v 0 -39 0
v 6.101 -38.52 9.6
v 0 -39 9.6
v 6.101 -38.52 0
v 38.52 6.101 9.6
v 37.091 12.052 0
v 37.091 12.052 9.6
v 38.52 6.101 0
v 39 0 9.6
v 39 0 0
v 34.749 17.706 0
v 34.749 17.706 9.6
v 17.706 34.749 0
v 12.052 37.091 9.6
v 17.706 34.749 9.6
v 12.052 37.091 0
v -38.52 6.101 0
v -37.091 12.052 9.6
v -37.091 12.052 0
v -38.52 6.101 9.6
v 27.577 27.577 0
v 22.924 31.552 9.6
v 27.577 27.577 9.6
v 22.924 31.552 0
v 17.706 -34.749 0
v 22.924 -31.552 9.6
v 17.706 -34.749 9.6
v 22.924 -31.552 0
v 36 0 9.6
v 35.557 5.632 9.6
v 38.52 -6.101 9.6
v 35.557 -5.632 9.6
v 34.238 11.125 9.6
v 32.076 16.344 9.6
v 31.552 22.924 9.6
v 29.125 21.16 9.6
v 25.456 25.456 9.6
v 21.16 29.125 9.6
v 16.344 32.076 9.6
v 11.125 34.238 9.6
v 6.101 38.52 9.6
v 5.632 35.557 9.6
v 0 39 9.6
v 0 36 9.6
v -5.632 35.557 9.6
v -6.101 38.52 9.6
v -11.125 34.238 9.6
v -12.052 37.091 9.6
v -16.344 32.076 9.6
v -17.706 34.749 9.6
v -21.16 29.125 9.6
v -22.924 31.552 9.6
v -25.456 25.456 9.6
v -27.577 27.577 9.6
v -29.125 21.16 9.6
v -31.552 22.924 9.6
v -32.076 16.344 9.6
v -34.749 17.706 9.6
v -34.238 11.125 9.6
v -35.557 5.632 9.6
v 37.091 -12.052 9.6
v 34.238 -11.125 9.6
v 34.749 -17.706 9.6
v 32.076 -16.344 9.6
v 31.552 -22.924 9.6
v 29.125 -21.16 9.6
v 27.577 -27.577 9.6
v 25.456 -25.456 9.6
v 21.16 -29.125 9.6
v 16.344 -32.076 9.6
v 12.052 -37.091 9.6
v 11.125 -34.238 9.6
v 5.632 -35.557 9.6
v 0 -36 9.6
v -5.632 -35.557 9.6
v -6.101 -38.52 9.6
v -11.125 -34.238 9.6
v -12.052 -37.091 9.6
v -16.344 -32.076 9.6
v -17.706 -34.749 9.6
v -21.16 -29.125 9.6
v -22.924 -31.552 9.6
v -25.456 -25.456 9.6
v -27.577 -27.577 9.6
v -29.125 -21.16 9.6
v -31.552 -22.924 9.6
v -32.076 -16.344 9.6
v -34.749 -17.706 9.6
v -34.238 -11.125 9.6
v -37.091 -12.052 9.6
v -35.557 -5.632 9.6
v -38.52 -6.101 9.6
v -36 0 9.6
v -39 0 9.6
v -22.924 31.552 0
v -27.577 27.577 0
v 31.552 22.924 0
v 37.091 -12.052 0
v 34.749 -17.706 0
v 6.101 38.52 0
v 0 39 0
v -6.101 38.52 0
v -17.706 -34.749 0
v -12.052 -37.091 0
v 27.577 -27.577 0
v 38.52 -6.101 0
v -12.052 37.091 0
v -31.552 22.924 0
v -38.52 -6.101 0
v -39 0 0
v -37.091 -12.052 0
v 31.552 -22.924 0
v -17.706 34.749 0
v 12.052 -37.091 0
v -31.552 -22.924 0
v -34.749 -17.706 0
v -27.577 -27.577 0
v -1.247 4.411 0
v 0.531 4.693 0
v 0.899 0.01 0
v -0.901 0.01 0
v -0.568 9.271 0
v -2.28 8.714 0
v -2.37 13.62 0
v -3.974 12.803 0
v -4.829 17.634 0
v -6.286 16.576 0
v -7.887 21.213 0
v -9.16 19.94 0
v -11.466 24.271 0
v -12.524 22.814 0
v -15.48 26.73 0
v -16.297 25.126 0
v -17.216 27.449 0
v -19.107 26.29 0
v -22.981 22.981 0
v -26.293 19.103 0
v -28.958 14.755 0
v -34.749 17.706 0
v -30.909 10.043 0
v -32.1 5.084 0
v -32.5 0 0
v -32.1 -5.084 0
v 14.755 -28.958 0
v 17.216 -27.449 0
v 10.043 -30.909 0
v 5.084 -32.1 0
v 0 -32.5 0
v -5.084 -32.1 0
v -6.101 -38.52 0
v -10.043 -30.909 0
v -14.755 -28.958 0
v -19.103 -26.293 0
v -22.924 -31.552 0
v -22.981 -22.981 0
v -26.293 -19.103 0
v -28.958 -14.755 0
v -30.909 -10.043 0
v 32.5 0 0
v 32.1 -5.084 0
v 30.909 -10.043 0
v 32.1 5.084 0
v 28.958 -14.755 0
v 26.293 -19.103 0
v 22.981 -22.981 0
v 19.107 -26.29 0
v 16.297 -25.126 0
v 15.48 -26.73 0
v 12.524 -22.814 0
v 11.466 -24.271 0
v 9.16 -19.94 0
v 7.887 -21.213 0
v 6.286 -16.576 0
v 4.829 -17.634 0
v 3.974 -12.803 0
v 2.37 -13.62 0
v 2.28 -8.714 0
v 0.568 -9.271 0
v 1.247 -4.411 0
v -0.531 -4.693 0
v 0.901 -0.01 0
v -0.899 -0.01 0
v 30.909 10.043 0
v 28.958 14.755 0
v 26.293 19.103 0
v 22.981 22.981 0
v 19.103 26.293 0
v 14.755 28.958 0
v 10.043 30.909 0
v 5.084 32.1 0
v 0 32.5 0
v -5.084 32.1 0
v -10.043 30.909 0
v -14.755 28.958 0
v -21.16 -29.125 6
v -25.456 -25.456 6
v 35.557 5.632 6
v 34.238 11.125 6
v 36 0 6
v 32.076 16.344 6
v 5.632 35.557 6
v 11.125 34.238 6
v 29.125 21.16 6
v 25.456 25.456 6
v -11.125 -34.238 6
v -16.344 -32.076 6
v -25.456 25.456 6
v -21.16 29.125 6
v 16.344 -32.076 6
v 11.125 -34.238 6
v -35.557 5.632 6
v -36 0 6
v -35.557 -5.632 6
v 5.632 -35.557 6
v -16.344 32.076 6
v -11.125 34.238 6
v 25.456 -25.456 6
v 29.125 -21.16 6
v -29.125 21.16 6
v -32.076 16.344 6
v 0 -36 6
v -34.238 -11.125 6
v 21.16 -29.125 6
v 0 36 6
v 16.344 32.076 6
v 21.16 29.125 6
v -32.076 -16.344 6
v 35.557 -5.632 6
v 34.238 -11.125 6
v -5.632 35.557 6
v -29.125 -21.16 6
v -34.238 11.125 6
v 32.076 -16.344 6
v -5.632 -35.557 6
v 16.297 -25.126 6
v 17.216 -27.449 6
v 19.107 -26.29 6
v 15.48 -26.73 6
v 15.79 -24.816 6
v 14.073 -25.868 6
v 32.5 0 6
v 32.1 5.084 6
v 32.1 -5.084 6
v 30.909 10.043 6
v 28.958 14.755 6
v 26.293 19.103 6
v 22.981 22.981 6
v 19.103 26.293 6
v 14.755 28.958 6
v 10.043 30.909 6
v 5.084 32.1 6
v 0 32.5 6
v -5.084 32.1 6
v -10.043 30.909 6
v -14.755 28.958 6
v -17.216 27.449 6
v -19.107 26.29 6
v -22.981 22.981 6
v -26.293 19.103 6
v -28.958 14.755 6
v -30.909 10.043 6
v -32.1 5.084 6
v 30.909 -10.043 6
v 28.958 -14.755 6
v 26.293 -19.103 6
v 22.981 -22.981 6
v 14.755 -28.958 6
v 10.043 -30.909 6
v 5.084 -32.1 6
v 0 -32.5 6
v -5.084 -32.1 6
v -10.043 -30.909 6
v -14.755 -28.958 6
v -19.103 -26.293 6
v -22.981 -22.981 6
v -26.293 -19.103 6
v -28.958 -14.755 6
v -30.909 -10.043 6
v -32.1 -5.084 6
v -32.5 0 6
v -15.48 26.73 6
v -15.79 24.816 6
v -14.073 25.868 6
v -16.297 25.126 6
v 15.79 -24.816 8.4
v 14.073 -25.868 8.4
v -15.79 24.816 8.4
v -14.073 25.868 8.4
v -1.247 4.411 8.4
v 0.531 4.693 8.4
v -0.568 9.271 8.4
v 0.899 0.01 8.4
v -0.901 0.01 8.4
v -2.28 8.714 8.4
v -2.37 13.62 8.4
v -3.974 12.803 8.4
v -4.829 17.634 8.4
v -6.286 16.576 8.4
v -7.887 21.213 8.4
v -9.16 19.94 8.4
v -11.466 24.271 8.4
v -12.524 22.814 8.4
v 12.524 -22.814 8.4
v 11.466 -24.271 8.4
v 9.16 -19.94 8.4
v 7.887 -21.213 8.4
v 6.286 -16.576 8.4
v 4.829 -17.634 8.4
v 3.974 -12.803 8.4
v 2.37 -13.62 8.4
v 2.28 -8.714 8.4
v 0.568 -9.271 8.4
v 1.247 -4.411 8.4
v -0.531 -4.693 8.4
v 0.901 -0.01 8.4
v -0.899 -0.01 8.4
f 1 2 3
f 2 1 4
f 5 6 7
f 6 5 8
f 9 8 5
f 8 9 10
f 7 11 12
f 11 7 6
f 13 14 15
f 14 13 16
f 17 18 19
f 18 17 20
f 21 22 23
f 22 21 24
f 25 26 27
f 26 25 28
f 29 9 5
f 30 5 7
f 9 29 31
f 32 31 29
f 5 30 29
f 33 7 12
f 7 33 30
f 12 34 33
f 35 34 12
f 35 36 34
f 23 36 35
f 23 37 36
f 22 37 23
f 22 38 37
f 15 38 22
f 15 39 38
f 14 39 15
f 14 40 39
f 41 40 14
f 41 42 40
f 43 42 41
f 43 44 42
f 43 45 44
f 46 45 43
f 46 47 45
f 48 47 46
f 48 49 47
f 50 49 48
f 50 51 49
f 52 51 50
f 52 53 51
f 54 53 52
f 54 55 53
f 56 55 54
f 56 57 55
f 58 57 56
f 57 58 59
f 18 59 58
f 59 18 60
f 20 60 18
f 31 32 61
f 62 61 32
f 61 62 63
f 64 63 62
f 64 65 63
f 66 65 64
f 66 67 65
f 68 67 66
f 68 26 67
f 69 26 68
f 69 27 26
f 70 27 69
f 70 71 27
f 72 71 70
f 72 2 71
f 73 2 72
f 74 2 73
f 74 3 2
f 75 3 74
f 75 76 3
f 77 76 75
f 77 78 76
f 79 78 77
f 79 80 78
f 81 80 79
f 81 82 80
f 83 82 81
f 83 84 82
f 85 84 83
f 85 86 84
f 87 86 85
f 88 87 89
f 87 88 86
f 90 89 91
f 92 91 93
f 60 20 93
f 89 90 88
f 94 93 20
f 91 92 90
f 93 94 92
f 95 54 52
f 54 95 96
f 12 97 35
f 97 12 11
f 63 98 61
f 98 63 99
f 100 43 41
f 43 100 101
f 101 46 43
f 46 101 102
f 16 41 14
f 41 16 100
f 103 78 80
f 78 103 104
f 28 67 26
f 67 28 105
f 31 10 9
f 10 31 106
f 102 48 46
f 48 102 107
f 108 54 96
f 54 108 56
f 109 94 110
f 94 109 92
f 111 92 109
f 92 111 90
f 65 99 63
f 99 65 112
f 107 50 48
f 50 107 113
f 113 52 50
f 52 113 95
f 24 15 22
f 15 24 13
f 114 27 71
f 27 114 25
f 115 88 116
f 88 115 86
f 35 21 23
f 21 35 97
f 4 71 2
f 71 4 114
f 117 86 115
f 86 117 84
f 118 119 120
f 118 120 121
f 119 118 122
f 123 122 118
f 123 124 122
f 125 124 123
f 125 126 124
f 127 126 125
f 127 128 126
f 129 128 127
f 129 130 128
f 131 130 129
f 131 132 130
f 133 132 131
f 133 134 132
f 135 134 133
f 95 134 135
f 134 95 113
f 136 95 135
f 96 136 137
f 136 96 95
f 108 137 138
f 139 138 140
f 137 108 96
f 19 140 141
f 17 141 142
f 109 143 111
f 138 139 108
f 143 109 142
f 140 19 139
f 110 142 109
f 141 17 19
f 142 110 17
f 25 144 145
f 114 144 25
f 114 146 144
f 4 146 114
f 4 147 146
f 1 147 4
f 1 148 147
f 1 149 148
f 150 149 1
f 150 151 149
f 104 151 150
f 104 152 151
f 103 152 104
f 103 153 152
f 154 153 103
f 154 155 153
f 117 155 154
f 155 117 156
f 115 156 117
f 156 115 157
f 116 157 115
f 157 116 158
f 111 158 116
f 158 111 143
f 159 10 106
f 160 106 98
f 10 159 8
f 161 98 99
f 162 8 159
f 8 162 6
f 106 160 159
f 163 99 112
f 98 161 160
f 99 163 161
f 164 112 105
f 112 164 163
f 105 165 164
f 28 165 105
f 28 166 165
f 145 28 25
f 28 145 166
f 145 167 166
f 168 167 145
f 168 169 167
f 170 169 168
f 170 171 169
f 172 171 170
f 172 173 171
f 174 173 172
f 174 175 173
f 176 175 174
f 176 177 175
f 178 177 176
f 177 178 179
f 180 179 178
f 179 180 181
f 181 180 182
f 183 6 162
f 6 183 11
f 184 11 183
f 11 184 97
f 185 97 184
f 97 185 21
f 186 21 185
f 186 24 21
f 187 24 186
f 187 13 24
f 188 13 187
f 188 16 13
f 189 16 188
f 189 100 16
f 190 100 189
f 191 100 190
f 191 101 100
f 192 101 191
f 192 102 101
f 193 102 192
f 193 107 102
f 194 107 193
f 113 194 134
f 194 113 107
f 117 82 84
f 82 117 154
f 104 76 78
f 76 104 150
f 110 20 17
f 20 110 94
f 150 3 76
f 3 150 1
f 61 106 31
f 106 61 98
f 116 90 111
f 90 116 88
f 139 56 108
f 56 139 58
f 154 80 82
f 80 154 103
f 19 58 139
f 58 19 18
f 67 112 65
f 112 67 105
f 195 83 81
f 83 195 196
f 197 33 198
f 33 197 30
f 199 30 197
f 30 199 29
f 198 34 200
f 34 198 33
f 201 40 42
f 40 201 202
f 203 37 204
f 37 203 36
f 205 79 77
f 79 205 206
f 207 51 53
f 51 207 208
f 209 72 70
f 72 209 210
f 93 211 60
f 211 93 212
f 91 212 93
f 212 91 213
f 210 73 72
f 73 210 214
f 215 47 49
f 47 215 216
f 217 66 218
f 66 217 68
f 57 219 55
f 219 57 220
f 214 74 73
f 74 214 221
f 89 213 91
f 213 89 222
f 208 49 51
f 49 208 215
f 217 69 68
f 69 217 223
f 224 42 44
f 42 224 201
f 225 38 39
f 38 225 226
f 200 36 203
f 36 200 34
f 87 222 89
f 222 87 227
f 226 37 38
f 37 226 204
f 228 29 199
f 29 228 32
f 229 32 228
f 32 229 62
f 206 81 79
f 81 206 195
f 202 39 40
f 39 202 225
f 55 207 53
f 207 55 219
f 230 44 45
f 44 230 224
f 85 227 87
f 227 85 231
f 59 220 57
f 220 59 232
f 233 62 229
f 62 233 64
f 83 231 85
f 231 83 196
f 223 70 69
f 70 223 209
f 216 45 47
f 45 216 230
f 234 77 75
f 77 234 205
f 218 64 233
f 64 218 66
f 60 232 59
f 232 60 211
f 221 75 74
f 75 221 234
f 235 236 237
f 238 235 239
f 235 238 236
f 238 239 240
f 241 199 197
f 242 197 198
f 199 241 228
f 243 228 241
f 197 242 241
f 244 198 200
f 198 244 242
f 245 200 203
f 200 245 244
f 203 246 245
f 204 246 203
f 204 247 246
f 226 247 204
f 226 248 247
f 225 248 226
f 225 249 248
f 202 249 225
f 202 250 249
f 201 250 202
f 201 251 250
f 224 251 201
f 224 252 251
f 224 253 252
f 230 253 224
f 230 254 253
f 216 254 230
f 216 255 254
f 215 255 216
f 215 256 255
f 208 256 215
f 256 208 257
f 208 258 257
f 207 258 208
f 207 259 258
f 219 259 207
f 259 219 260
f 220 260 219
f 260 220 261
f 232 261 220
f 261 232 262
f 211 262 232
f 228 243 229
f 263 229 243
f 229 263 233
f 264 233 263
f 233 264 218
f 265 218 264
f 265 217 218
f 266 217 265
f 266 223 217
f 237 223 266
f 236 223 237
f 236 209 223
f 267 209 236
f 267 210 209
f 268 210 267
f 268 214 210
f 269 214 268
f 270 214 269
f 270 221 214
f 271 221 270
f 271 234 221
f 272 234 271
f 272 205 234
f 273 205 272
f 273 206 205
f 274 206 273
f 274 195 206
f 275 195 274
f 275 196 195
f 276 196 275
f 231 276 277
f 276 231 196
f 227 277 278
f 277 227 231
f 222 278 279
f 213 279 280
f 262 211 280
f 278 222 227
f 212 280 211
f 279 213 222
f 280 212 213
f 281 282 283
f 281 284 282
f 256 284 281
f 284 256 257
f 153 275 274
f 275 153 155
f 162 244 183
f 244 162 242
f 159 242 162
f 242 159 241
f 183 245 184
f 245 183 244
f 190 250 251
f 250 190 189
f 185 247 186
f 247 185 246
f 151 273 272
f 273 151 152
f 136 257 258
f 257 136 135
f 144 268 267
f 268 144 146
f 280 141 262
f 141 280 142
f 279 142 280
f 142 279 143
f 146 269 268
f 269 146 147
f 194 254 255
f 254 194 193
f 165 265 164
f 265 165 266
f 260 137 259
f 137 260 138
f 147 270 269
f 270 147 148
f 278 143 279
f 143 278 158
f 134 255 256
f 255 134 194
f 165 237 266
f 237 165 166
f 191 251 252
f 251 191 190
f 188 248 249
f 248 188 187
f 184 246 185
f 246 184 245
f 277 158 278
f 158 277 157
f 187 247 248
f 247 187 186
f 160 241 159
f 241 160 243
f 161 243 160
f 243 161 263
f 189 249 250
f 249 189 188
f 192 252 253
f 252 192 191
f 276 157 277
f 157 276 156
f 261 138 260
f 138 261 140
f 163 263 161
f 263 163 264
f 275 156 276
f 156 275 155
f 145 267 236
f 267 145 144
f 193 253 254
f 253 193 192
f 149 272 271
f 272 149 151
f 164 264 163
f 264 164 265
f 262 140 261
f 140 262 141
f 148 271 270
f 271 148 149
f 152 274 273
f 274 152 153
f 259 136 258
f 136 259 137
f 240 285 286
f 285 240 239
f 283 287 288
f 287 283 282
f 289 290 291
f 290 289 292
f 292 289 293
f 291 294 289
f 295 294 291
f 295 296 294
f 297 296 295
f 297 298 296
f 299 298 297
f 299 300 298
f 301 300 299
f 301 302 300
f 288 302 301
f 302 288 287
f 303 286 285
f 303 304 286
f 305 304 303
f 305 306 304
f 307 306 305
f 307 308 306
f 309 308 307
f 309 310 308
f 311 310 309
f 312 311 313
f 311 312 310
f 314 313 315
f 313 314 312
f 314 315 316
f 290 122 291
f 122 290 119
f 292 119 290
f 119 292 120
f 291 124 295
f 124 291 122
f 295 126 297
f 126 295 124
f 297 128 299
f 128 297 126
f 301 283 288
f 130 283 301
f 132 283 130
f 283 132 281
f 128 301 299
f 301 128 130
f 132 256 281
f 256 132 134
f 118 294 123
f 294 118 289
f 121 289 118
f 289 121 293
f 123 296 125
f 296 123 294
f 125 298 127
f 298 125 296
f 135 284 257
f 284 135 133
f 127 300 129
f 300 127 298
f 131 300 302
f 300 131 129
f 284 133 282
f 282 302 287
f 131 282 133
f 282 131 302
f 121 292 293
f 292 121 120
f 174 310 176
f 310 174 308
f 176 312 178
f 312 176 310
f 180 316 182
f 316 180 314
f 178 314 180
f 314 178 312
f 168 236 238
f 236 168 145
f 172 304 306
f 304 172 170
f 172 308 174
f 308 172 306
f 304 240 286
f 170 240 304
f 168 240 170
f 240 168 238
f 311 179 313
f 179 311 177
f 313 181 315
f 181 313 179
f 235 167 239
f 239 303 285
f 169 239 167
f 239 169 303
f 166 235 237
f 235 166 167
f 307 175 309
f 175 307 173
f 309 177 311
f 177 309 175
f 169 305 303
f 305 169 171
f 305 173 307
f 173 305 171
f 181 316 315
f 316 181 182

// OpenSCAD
/* [Global] */
Porta_Filter_Outside_Diameter = 71; // [10:150]
Porta_Filter_Inside_Diameter = 60; //[10:150]
Reach_Into_Porta_Filter_x_10 = 24; //[0:100]
Outside_Wall_Height_x_10 = 36; //[0:100]
/* [Hidden] */
Clearance = 0.5;
Smoothness=40;
pf_r = Porta_Filter_Outside_Diameter/2;
circle_thickness = 3;
support_height=6;
tab_height=Outside_Wall_Height_x_10/10;
central_column_h = 5;
central_column_r = 1.5;

wiper_height = support_height+Reach_Into_Porta_Filter_x_10/10;
wiper_thickness = 1.8;

union(){

difference(){
	cylinder(h=support_height+tab_height,r=pf_r+circle_thickness+Clearance,$fn=Smoothness);//outer
	cylinder(h=support_height+tab_height,r=pf_r+Clearance,$fn=Smoothness);//inner
}
difference(){
	cylinder(h=support_height,r=pf_r+Clearance+0.1,$fn=Smoothness);//inner
	cylinder(h=support_height,r=pf_r-circle_thickness,$fn=Smoothness);//outer
}

intersection(){
union(){
cylinder(h=wiper_height,r=Porta_Filter_Inside_Diameter/2-Clearance,$fn=Smoothness);//inner
cylinder(h=support_height,r=pf_r-circle_thickness+0.01,$fn=Smoothness);//inner

}
union(){
translate([-Porta_Filter_Inside_Diameter/2+wiper_thickness/2,0,0])difference(){
	cylinder(h=wiper_height,r=Porta_Filter_Inside_Diameter/2,$fn=Smoothness);//inner
	cylinder(h=wiper_height,r=Porta_Filter_Inside_Diameter/2-wiper_thickness,$fn=Smoothness);//outer
	//translate([Porta_Filter_Outside_Diameter*2,0,0])cube([Porta_Filter_Outside_Diameter*4,Porta_Filter_Outside_Diameter*4,support_height*4],center=true);
	translate([0,-Porta_Filter_Outside_Diameter*2+0.01,0])cube([Porta_Filter_Outside_Diameter*4,Porta_Filter_Outside_Diameter*4,wiper_height*4],center=true);
}
translate([Porta_Filter_Inside_Diameter/2-wiper_thickness/2,0,0])difference(){
	cylinder(h=wiper_height,r=Porta_Filter_Inside_Diameter/2,$fn=Smoothness);//inner
	cylinder(h=wiper_height,r=Porta_Filter_Inside_Diameter/2-wiper_thickness,$fn=Smoothness);//outer
	//translate([Porta_Filter_Outside_Diameter*2,0,0])cube([Porta_Filter_Outside_Diameter*4,Porta_Filter_Outside_Diameter*4,support_height*4],center=true);
	translate([0,Porta_Filter_Outside_Diameter*2-0.01,0])cube([Porta_Filter_Outside_Diameter*4,Porta_Filter_Outside_Diameter*4,wiper_height*4],center=true);
}
}
}
}
